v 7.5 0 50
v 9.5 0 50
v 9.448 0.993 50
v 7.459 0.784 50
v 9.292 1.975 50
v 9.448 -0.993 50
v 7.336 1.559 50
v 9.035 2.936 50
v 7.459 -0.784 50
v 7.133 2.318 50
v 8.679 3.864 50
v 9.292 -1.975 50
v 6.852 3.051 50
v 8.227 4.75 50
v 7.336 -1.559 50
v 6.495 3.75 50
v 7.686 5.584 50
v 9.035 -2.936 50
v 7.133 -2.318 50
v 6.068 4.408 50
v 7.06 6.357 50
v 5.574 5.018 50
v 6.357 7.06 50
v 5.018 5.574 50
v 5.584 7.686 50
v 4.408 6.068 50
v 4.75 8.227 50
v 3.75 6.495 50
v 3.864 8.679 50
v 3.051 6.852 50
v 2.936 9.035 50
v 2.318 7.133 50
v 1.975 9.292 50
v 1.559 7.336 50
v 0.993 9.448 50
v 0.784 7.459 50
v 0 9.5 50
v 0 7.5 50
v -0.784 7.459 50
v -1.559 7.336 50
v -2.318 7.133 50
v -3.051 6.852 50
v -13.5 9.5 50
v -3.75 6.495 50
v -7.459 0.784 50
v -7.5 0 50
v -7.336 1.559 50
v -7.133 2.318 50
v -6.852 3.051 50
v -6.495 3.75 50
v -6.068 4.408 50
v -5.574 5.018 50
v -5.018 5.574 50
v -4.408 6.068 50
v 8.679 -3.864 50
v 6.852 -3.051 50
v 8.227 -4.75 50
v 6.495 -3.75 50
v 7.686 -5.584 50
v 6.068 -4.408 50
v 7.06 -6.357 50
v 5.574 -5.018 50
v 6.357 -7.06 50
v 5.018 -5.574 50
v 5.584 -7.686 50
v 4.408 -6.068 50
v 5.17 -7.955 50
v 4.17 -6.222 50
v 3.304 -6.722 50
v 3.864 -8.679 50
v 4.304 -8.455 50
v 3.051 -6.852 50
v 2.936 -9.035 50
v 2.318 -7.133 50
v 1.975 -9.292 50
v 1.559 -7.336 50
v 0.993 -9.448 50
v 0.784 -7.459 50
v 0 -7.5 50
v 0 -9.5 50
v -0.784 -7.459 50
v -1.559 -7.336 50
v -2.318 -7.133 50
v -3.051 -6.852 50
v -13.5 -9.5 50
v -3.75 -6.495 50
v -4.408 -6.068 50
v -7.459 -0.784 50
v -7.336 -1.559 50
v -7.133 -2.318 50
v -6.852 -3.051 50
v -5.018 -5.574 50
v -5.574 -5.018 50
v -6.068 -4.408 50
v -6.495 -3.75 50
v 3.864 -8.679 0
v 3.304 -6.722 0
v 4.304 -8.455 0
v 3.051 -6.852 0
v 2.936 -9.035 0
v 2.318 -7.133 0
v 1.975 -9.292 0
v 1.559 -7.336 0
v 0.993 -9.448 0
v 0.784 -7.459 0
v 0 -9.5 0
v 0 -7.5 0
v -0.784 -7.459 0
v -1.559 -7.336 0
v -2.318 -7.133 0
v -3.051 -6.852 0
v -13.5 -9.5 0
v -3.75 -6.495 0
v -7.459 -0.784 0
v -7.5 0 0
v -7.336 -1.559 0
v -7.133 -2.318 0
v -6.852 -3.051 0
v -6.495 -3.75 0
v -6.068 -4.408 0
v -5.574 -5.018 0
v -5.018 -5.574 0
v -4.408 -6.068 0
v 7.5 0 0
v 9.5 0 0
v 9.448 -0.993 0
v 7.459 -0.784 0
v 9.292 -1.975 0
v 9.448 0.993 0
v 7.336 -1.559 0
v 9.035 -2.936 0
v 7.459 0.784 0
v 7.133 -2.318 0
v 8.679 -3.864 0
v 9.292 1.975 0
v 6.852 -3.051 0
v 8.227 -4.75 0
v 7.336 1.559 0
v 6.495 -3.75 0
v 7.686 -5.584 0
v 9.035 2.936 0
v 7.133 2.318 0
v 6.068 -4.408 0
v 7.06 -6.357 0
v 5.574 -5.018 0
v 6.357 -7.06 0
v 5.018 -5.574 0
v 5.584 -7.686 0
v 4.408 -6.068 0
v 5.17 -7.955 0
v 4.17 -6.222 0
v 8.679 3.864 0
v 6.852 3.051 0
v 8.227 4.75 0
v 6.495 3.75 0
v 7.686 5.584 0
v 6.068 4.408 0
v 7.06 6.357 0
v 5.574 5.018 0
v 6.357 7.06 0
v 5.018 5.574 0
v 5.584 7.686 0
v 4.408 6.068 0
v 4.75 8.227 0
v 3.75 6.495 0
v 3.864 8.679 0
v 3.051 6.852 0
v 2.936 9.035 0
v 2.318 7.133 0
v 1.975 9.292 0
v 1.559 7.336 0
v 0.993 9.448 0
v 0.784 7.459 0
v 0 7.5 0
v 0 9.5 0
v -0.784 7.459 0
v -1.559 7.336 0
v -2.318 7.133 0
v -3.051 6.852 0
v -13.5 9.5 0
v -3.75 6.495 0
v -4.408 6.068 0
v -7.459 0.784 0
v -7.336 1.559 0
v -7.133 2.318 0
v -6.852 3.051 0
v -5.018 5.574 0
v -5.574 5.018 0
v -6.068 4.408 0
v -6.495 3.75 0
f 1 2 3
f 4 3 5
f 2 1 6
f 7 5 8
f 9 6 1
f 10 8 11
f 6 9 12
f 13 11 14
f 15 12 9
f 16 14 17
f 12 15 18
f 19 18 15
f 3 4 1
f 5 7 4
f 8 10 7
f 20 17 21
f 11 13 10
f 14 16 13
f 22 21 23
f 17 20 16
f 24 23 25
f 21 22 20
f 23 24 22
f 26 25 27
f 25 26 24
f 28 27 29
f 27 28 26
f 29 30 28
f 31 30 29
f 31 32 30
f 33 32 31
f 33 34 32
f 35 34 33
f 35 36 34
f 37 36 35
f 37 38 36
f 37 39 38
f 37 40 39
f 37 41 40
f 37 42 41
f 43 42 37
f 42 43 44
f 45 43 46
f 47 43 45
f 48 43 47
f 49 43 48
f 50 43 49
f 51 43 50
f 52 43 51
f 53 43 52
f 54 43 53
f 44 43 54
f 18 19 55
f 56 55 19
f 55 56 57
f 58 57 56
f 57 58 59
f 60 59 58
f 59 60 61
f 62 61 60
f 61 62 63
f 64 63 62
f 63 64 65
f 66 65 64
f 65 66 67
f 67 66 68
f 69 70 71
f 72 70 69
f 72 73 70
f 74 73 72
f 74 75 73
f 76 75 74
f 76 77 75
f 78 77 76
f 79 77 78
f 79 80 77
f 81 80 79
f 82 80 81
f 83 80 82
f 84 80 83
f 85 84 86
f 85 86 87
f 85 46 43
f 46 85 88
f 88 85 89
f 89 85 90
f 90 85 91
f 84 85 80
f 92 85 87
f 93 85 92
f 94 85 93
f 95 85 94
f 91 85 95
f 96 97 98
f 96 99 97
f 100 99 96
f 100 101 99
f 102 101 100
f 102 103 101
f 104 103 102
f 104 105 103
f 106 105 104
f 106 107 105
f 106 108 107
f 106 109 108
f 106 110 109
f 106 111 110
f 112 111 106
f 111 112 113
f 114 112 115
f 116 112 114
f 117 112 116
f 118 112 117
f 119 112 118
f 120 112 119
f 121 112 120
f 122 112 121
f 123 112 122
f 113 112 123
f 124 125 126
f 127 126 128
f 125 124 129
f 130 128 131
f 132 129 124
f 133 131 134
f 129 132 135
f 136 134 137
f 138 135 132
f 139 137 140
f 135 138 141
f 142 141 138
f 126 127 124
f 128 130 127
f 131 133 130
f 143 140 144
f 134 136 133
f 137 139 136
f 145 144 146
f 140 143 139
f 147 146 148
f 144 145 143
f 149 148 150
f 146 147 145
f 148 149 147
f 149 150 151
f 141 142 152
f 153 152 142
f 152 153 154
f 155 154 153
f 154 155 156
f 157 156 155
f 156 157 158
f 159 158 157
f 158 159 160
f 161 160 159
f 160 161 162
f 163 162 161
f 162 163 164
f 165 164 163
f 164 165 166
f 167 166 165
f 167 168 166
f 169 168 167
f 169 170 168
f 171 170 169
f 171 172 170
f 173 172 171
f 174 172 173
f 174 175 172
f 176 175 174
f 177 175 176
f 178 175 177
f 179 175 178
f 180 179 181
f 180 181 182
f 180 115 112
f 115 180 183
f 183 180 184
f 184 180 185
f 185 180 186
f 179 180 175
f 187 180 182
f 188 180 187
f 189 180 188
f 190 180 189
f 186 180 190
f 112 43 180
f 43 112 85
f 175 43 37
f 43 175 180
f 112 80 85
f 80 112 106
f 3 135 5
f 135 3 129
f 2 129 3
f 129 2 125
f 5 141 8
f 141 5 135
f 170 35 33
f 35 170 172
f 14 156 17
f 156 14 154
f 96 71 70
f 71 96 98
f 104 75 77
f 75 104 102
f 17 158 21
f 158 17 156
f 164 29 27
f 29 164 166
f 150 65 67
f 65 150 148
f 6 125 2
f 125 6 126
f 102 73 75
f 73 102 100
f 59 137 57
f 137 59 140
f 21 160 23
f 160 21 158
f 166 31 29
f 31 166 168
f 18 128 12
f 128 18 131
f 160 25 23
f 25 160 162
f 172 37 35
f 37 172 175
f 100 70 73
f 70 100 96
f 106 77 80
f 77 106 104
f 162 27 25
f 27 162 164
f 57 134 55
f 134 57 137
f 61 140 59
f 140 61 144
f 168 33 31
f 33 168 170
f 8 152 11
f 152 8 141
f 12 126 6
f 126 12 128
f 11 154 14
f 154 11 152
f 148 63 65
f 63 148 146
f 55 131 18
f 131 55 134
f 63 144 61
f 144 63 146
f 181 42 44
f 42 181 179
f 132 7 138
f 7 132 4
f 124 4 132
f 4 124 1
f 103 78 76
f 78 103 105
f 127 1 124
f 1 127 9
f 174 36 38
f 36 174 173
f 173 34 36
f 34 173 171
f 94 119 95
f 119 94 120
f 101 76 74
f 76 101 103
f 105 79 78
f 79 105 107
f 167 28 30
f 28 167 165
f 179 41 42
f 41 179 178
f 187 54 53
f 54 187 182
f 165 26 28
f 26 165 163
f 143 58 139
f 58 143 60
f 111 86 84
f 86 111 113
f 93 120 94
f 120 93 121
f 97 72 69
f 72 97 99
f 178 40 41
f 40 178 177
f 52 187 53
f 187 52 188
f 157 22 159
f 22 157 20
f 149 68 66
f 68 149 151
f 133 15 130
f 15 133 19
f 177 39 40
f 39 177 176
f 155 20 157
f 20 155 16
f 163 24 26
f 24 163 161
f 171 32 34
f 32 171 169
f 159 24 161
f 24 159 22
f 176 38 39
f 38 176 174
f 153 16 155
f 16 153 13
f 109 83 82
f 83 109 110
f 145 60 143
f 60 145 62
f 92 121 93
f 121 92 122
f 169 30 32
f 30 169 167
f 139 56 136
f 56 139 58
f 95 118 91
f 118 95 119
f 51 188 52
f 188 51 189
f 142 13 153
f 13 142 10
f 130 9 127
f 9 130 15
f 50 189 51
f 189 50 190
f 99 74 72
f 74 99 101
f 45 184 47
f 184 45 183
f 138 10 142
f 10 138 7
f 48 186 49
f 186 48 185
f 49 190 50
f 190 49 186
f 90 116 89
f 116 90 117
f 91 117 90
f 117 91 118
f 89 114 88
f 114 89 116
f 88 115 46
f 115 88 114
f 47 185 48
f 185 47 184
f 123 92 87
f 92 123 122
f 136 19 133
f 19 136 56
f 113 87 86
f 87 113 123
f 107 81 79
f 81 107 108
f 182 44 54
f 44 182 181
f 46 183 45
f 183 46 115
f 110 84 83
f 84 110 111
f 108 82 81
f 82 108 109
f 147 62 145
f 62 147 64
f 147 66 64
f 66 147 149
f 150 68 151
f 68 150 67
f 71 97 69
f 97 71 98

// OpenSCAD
// PRUSA iteration3
// Bearing holders
// GNU GPL v3
// Josef Průša <iam@josefprusa.cz> and contributors
// http://www.reprap.org/wiki/Prusa_Mendel
// http://prusamendel.org

bearing_diameter = 15;

module horizontal_bearing_base(bearings=1){
 translate(v=[0,0,8/2]) cube(size = [24,8+bearings*25,8], center = true);	
}
module horizontal_bearing_holes(bearings=1){
 cutter_lenght = 10+bearings*25;
 one_holder_lenght = 8+25;
 holder_lenght = 8+bearings*25;
 
 // Main bearing cut
 difference(){
  translate(v=[0,0,12]) rotate(a=[90,0,0]) translate(v=[0,0,-cutter_lenght/2]) cylinder(h = cutter_lenght, r=bearing_diameter/2, $fn=50);
  // Bearing retainers
  translate(v=[0,1-holder_lenght/2,3]) cube(size = [24,6,8], center = true);
  translate(v=[0,-1+holder_lenght/2,3]) cube(size = [24,6,8], center = true);
 }
 
 // Ziptie cutouts
 ziptie_cut_ofset = 0;
 for ( i = [0 : bearings-1] ){
  // For easier positioning I move them by half of one 
  // bearing holder then add each bearign lenght and then center again
  translate(v=[0,-holder_lenght/2,0]) translate(v=[0,one_holder_lenght/2+i*25,0]) difference(){
   union(){
    translate(v=[0,2-6,12]) rotate(a=[90,0,0]) translate(v=[0,0,0]) cylinder(h = 4, r=12.5, $fn=50);
    translate(v=[0,2+6,12]) rotate(a=[90,0,0]) translate(v=[0,0,0]) cylinder(h = 4, r=12.5, $fn=50);
   }
   translate(v=[0,10,12]) rotate(a=[90,0,0]) translate(v=[0,0,0]) cylinder(h = 24, r=10, $fn=50);
  }
 }
 
}

*difference() {
horizontal_bearing_base();
horizontal_bearing_holes();
}

module horizontal_bearing_test(){
 difference(){
  horizontal_bearing_base(1);
  horizontal_bearing_holes(1);
 }
 translate(v=[30,0,0]) difference(){
  horizontal_bearing_base(2);
  horizontal_bearing_holes(2);
 }
 translate(v=[60,0,0]) difference(){
  horizontal_bearing_base(3);
  horizontal_bearing_holes(3);
 }
}


vertical_bearing_height = 50;

thinwall = 2;
bearing_size = bearing_diameter + 2 * thinwall;

module vertical_bearing_base(){
 translate(v=[-2-bearing_size/4,0,vertical_bearing_height/2]) cube(size = [4+bearing_size/2,bearing_size,vertical_bearing_height], center = true);
 cylinder(h = vertical_bearing_height, r=bearing_size/2, $fn = 60);
}

module vertical_bearing_holes(){
  translate(v=[0,0,-1]) cylinder(h = vertical_bearing_height+10, r=bearing_diameter/2, $fn = 60);
  rotate(a=[0,0,-60]) translate(v=[10,0,vertical_bearing_height/2+1]) cube(size = [10,1,vertical_bearing_height+2], center = true);
}

difference(){
vertical_bearing_base();
vertical_bearing_holes();
}
